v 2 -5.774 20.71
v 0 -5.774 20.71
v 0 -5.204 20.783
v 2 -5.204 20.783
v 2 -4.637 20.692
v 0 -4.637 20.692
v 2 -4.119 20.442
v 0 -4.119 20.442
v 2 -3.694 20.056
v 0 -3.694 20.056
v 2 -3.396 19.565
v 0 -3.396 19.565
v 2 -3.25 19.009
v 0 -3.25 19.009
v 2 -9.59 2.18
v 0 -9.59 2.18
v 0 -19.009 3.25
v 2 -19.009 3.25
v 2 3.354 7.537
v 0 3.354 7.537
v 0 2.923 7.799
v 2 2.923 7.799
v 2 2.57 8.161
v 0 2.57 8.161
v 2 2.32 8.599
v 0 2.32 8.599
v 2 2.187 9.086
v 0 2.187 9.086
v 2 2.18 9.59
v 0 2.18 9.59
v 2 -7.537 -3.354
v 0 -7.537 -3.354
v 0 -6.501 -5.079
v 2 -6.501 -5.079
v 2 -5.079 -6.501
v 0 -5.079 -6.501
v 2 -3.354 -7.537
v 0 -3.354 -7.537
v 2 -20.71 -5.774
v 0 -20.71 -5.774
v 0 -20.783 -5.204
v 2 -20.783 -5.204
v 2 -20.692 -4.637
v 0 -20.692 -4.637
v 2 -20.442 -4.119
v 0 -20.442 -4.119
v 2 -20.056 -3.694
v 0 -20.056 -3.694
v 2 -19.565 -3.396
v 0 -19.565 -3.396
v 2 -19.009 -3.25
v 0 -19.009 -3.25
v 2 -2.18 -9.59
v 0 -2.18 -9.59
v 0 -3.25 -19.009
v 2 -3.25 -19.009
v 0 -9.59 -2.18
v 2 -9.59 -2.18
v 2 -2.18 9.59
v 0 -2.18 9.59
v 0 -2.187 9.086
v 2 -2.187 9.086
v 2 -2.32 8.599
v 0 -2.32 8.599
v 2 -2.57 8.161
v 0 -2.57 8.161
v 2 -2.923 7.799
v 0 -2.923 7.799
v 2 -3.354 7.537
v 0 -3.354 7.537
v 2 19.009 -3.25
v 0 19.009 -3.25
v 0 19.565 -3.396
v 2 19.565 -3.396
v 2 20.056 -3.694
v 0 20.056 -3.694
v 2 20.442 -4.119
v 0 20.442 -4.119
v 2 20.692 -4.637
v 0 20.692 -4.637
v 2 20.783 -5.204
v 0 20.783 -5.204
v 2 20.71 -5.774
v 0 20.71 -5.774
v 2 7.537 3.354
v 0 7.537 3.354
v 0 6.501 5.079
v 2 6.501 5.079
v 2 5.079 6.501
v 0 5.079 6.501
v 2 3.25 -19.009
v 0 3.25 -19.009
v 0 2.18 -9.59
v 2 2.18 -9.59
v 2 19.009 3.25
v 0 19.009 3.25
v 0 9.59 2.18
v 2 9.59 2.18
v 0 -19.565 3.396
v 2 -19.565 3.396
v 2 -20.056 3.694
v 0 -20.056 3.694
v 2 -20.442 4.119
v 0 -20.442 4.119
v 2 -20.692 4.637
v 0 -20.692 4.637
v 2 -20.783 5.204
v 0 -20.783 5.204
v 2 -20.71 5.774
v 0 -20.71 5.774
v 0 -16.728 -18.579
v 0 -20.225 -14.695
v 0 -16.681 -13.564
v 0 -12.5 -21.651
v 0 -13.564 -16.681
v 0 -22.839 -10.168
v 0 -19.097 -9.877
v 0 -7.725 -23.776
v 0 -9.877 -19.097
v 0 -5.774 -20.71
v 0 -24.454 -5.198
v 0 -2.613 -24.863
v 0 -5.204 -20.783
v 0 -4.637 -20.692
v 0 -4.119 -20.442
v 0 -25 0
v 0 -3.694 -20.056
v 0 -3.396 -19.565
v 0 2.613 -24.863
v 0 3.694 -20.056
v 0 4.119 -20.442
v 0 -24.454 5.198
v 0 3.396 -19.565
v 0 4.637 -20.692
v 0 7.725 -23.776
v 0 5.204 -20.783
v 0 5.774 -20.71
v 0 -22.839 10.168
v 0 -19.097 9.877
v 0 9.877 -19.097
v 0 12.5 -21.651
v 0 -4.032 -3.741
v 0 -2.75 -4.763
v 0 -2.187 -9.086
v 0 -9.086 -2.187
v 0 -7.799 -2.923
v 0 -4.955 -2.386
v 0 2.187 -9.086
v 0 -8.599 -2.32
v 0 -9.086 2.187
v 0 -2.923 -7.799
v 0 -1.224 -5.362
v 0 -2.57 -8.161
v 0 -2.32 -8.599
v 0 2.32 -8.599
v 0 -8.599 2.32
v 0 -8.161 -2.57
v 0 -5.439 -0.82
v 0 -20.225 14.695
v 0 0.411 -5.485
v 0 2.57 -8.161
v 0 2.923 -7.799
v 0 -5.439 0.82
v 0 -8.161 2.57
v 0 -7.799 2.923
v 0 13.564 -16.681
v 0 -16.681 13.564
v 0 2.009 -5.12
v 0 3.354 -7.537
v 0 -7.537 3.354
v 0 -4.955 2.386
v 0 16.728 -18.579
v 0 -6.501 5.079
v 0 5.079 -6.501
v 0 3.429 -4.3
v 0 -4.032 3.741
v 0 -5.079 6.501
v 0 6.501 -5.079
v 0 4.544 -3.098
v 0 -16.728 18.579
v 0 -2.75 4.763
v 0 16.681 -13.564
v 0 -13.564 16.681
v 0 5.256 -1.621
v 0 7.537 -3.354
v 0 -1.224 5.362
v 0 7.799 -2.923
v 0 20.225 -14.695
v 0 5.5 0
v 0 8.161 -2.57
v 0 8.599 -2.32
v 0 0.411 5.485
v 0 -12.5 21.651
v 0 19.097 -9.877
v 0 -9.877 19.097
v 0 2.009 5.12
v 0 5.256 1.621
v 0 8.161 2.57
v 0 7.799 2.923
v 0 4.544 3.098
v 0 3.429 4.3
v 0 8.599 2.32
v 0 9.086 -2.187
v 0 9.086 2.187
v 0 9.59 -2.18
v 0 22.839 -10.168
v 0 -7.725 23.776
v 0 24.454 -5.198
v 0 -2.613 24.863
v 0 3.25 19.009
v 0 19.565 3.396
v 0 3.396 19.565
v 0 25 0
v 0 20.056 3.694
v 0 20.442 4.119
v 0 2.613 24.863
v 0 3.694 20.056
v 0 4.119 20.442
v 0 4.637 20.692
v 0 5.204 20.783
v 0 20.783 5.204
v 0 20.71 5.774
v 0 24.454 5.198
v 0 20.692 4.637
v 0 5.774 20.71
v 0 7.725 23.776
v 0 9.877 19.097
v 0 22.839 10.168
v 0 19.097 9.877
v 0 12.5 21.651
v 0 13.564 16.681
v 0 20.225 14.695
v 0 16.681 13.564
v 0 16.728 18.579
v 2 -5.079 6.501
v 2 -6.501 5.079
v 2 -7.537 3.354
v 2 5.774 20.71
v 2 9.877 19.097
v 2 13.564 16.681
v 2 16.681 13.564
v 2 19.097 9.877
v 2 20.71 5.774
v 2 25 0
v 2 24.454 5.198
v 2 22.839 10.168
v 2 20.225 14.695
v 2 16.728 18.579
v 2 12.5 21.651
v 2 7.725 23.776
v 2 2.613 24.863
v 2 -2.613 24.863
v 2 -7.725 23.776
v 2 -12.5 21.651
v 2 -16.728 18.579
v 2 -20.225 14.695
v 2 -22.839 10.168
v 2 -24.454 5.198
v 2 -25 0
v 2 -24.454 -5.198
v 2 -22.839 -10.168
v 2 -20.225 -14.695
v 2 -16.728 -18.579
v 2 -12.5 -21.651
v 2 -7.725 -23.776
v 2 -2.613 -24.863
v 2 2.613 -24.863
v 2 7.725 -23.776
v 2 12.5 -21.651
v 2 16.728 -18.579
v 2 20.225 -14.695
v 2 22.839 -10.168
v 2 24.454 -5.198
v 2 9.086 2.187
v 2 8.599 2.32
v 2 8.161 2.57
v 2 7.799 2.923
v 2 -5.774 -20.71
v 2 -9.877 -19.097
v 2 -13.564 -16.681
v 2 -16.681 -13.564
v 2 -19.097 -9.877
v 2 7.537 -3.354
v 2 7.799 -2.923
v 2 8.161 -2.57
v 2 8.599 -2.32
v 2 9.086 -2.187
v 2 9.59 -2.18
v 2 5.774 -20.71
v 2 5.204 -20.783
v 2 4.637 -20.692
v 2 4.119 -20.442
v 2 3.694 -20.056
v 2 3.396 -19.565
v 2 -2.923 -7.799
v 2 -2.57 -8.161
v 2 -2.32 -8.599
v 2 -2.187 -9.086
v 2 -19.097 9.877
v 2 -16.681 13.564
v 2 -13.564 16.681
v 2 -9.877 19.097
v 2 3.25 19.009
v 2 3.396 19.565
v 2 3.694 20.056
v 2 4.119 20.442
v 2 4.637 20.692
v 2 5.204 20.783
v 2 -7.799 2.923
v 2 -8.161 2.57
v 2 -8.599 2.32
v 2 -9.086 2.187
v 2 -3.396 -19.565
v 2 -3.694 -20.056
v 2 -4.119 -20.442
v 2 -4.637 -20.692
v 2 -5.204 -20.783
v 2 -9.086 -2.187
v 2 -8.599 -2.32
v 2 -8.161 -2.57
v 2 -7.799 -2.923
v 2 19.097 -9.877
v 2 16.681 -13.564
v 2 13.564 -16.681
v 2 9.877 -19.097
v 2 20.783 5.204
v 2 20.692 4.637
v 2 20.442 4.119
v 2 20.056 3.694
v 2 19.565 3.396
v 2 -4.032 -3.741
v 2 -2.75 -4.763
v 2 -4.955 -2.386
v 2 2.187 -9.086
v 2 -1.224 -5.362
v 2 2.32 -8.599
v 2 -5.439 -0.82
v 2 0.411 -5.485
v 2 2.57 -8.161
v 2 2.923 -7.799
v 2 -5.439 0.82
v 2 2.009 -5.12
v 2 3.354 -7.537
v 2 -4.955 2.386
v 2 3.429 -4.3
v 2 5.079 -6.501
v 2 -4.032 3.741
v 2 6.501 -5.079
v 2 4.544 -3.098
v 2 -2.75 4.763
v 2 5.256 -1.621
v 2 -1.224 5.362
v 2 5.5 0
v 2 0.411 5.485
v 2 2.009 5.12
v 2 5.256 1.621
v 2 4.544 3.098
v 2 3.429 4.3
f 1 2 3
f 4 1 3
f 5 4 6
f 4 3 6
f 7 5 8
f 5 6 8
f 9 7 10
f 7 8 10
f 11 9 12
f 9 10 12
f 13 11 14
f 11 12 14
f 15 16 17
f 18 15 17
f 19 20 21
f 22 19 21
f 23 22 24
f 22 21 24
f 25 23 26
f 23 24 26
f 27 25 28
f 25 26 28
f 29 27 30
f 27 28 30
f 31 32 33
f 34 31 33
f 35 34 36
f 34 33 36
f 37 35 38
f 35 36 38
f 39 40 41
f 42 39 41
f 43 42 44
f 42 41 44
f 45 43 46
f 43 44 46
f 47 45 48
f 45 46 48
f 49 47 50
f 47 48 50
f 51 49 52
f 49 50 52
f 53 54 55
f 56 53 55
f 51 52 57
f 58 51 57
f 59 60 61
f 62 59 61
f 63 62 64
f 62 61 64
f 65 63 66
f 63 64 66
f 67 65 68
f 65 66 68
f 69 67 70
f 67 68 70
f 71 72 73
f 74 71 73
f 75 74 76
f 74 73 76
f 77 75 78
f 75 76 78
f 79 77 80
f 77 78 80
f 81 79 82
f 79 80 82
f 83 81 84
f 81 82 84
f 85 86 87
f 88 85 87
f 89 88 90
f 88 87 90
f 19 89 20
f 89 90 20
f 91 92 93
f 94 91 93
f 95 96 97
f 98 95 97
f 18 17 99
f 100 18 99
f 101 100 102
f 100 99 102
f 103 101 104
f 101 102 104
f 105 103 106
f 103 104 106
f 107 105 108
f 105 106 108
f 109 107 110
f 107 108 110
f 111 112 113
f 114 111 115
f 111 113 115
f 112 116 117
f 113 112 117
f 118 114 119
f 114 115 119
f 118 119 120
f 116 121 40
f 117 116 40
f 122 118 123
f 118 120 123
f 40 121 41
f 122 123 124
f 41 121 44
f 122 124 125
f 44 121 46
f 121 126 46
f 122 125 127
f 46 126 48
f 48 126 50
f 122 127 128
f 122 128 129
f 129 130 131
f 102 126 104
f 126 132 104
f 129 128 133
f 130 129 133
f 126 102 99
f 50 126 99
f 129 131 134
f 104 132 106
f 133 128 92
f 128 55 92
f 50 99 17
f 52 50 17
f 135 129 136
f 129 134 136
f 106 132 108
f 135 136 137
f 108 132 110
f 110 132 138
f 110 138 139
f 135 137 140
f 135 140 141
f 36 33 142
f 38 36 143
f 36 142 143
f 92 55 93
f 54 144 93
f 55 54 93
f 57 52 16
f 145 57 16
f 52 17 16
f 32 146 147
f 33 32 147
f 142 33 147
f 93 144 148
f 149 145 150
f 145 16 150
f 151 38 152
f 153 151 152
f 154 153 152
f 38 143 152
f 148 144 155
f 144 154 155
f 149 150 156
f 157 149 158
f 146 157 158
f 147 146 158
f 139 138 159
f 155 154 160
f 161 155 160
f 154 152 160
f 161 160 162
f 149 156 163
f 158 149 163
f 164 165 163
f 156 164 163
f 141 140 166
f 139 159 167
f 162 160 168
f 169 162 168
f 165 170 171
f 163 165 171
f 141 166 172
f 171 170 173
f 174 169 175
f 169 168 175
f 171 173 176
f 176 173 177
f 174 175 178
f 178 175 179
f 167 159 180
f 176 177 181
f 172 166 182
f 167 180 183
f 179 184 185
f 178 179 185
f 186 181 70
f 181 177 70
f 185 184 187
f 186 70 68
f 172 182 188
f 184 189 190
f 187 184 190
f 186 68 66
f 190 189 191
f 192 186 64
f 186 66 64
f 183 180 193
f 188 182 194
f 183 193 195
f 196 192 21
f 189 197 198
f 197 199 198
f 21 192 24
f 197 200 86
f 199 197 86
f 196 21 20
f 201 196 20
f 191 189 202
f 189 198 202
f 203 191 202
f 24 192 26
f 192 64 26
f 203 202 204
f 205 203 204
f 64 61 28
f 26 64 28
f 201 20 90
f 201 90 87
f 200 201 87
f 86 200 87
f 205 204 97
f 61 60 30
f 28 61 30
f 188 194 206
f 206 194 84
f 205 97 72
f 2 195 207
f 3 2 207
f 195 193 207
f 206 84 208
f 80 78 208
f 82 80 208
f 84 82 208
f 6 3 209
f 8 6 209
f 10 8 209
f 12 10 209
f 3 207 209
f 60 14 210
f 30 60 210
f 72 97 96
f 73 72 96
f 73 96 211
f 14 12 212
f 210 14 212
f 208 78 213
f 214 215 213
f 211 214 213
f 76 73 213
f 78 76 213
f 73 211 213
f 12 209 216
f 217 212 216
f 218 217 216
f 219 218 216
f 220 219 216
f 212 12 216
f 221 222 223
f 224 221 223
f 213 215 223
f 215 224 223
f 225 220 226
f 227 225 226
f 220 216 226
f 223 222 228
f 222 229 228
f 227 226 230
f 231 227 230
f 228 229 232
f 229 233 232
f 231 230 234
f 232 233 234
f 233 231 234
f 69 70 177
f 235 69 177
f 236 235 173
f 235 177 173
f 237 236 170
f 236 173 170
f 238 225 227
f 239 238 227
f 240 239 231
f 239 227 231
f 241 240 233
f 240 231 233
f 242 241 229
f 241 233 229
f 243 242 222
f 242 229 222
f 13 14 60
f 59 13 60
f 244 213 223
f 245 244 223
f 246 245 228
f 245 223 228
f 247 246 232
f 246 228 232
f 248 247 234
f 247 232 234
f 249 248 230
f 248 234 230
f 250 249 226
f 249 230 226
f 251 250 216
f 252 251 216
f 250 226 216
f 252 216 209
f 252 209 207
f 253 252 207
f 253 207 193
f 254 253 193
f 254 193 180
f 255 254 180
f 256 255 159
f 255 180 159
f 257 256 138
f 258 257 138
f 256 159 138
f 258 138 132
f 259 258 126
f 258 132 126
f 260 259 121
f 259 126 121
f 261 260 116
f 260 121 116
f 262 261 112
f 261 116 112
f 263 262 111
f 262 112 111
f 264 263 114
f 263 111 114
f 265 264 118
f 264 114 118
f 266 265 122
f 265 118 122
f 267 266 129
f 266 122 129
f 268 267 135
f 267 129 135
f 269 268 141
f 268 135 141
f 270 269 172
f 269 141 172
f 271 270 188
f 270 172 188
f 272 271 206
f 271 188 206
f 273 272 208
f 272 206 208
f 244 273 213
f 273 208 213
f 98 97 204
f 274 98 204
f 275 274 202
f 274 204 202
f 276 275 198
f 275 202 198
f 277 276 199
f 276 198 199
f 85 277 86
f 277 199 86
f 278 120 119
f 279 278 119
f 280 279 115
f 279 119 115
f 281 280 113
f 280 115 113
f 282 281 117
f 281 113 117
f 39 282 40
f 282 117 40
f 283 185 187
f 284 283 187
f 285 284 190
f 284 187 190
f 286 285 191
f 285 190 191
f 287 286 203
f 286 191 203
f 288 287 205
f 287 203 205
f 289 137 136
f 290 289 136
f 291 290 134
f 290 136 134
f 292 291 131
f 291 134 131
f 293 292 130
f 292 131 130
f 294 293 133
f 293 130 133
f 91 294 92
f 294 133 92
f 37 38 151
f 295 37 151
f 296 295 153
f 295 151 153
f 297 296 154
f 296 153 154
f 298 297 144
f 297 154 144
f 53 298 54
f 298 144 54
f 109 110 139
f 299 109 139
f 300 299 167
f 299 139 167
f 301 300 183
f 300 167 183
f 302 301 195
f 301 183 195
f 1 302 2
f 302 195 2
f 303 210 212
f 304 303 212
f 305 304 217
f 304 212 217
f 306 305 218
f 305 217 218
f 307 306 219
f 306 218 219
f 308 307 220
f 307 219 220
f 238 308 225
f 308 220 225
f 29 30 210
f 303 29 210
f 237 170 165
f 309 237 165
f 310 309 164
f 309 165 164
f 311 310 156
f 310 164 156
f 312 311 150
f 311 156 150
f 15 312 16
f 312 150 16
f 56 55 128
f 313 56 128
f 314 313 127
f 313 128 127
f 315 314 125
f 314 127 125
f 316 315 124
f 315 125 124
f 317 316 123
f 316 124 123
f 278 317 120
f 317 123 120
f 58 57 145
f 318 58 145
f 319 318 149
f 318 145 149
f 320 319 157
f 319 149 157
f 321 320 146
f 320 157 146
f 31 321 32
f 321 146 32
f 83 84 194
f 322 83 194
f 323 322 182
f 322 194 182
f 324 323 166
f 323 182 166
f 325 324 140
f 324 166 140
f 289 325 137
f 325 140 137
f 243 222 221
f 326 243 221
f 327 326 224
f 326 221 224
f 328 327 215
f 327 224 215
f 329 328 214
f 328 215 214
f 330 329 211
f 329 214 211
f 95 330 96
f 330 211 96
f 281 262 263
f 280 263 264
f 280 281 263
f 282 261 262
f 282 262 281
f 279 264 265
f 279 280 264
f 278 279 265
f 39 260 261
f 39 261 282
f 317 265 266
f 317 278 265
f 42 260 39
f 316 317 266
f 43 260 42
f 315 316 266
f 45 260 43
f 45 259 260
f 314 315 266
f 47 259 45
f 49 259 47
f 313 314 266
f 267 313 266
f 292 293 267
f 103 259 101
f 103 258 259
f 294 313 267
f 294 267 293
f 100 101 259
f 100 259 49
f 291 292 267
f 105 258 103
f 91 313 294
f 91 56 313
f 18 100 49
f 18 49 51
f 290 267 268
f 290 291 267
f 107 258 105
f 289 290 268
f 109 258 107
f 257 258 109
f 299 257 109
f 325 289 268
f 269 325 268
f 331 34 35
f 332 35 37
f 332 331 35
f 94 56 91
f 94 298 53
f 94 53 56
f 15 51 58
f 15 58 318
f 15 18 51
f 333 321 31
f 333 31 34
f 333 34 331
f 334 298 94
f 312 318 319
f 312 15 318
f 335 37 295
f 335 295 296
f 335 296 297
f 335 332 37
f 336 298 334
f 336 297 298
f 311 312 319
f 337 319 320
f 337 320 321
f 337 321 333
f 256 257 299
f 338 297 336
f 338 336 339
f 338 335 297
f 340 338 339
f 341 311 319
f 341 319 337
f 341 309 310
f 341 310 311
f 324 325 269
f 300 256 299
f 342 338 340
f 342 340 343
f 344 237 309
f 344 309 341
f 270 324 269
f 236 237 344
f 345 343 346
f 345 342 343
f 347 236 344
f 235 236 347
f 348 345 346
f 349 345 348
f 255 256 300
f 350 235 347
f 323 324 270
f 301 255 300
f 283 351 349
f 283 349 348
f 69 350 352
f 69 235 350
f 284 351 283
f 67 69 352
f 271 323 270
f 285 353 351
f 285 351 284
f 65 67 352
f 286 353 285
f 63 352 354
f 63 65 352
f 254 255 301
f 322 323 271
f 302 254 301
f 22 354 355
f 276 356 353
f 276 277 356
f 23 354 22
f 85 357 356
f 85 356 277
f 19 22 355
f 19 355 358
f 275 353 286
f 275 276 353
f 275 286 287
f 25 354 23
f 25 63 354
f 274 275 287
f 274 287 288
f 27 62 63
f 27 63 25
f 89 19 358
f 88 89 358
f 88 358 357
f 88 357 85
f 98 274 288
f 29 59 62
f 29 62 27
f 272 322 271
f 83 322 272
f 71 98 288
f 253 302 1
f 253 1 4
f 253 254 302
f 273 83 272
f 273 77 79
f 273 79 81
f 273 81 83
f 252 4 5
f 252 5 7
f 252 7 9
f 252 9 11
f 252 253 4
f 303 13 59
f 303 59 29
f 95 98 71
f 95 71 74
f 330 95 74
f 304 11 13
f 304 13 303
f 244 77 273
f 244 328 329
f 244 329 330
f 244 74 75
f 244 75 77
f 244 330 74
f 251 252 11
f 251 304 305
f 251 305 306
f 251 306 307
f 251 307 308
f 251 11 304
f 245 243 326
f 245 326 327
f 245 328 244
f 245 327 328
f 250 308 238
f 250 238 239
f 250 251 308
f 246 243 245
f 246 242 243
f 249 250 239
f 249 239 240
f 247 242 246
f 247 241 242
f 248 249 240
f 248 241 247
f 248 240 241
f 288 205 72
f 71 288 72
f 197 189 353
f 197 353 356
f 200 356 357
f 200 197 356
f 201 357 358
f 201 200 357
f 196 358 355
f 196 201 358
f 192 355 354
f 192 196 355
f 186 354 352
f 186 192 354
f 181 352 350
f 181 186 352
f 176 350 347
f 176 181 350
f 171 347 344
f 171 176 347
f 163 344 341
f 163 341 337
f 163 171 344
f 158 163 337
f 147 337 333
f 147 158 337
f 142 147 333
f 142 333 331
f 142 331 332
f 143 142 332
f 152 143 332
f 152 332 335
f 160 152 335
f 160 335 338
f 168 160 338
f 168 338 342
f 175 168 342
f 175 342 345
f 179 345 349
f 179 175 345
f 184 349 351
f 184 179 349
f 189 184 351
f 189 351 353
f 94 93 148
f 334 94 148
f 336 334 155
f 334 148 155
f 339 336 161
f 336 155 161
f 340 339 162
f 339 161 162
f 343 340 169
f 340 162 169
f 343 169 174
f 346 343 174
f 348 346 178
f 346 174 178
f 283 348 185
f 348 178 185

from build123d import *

# Parameters (mm, degrees)
F0_R     = 25
F0_R_2   = 5.5
F1_DEPTH = 2


with BuildPart() as f1:
    # F0 (on Right) → F1 (new body)
    with BuildSketch(Plane.YZ):
        Circle(F0_R)
        with BuildLine():
            ThreePointArc((-20.710142, -5.774083), (-20.442251, -4.119402), (-19.009279, -3.24973))
            Line((-19.009279, -3.24973), (-9.590252, -2.18014))
            ThreePointArc((-9.590252, -2.18014), (-8.371676, -2.431246), (-7.537353, -3.354223))
            ThreePointArc((-7.537353, -3.354223), (-5.833631, -5.833631), (-3.354223, -7.537353))
            ThreePointArc((-3.354223, -7.537353), (-2.431246, -8.371676), (-2.18014, -9.590252))
            Line((-2.18014, -9.590252), (-3.24973, -19.009279))
            ThreePointArc((-3.24973, -19.009279), (-4.119402, -20.442251), (-5.774083, -20.710142))
            ThreePointArc((-5.774083, -20.710142), (-15.202796, -15.202796), (-20.710142, -5.774083))
        make_face(mode=Mode.SUBTRACT)
        with BuildLine():
            ThreePointArc((5.774083, -20.710142), (4.119402, -20.442251), (3.24973, -19.009279))
            Line((3.24973, -19.009279), (2.18014, -9.590252))
            ThreePointArc((2.18014, -9.590252), (2.431246, -8.371676), (3.354223, -7.537353))
            ThreePointArc((3.354223, -7.537353), (5.833631, -5.833631), (7.537353, -3.354223))
            ThreePointArc((7.537353, -3.354223), (8.371676, -2.431246), (9.590252, -2.18014))
            Line((9.590252, -2.18014), (19.009279, -3.24973))
            ThreePointArc((19.009279, -3.24973), (20.442251, -4.119402), (20.710142, -5.774083))
            ThreePointArc((20.710142, -5.774083), (15.202796, -15.202796), (5.774083, -20.710142))
        make_face(mode=Mode.SUBTRACT)
        with BuildLine():
            ThreePointArc((-20.710142, 5.774083), (-15.202796, 15.202796), (-5.774083, 20.710142))
            ThreePointArc((-5.774083, 20.710142), (-4.119402, 20.442251), (-3.24973, 19.009279))
            Line((-3.24973, 19.009279), (-2.18014, 9.590252))
            ThreePointArc((-2.18014, 9.590252), (-2.431246, 8.371676), (-3.354223, 7.537353))
            ThreePointArc((-3.354223, 7.537353), (-5.833631, 5.833631), (-7.537353, 3.354223))
            ThreePointArc((-7.537353, 3.354223), (-8.371676, 2.431246), (-9.590252, 2.18014))
            Line((-9.590252, 2.18014), (-19.009279, 3.24973))
            ThreePointArc((-19.009279, 3.24973), (-20.442251, 4.119402), (-20.710142, 5.774083))
        make_face(mode=Mode.SUBTRACT)
        Circle(F0_R_2, mode=Mode.SUBTRACT)
        with BuildLine():
            Line((2.18014, 9.590252), (3.24973, 19.009279))
            ThreePointArc((3.24973, 19.009279), (4.119402, 20.442251), (5.774083, 20.710142))
            ThreePointArc((5.774083, 20.710142), (15.202796, 15.202796), (20.710142, 5.774083))
            ThreePointArc((20.710142, 5.774083), (20.442251, 4.119402), (19.009279, 3.24973))
            Line((19.009279, 3.24973), (9.590252, 2.18014))
            ThreePointArc((9.590252, 2.18014), (8.371676, 2.431246), (7.537353, 3.354223))
            ThreePointArc((7.537353, 3.354223), (5.833631, 5.833631), (3.354223, 7.537353))
            ThreePointArc((3.354223, 7.537353), (2.431246, 8.371676), (2.18014, 9.590252))
        make_face(mode=Mode.SUBTRACT)
    extrude(amount=F1_DEPTH)


solid = f1.part
